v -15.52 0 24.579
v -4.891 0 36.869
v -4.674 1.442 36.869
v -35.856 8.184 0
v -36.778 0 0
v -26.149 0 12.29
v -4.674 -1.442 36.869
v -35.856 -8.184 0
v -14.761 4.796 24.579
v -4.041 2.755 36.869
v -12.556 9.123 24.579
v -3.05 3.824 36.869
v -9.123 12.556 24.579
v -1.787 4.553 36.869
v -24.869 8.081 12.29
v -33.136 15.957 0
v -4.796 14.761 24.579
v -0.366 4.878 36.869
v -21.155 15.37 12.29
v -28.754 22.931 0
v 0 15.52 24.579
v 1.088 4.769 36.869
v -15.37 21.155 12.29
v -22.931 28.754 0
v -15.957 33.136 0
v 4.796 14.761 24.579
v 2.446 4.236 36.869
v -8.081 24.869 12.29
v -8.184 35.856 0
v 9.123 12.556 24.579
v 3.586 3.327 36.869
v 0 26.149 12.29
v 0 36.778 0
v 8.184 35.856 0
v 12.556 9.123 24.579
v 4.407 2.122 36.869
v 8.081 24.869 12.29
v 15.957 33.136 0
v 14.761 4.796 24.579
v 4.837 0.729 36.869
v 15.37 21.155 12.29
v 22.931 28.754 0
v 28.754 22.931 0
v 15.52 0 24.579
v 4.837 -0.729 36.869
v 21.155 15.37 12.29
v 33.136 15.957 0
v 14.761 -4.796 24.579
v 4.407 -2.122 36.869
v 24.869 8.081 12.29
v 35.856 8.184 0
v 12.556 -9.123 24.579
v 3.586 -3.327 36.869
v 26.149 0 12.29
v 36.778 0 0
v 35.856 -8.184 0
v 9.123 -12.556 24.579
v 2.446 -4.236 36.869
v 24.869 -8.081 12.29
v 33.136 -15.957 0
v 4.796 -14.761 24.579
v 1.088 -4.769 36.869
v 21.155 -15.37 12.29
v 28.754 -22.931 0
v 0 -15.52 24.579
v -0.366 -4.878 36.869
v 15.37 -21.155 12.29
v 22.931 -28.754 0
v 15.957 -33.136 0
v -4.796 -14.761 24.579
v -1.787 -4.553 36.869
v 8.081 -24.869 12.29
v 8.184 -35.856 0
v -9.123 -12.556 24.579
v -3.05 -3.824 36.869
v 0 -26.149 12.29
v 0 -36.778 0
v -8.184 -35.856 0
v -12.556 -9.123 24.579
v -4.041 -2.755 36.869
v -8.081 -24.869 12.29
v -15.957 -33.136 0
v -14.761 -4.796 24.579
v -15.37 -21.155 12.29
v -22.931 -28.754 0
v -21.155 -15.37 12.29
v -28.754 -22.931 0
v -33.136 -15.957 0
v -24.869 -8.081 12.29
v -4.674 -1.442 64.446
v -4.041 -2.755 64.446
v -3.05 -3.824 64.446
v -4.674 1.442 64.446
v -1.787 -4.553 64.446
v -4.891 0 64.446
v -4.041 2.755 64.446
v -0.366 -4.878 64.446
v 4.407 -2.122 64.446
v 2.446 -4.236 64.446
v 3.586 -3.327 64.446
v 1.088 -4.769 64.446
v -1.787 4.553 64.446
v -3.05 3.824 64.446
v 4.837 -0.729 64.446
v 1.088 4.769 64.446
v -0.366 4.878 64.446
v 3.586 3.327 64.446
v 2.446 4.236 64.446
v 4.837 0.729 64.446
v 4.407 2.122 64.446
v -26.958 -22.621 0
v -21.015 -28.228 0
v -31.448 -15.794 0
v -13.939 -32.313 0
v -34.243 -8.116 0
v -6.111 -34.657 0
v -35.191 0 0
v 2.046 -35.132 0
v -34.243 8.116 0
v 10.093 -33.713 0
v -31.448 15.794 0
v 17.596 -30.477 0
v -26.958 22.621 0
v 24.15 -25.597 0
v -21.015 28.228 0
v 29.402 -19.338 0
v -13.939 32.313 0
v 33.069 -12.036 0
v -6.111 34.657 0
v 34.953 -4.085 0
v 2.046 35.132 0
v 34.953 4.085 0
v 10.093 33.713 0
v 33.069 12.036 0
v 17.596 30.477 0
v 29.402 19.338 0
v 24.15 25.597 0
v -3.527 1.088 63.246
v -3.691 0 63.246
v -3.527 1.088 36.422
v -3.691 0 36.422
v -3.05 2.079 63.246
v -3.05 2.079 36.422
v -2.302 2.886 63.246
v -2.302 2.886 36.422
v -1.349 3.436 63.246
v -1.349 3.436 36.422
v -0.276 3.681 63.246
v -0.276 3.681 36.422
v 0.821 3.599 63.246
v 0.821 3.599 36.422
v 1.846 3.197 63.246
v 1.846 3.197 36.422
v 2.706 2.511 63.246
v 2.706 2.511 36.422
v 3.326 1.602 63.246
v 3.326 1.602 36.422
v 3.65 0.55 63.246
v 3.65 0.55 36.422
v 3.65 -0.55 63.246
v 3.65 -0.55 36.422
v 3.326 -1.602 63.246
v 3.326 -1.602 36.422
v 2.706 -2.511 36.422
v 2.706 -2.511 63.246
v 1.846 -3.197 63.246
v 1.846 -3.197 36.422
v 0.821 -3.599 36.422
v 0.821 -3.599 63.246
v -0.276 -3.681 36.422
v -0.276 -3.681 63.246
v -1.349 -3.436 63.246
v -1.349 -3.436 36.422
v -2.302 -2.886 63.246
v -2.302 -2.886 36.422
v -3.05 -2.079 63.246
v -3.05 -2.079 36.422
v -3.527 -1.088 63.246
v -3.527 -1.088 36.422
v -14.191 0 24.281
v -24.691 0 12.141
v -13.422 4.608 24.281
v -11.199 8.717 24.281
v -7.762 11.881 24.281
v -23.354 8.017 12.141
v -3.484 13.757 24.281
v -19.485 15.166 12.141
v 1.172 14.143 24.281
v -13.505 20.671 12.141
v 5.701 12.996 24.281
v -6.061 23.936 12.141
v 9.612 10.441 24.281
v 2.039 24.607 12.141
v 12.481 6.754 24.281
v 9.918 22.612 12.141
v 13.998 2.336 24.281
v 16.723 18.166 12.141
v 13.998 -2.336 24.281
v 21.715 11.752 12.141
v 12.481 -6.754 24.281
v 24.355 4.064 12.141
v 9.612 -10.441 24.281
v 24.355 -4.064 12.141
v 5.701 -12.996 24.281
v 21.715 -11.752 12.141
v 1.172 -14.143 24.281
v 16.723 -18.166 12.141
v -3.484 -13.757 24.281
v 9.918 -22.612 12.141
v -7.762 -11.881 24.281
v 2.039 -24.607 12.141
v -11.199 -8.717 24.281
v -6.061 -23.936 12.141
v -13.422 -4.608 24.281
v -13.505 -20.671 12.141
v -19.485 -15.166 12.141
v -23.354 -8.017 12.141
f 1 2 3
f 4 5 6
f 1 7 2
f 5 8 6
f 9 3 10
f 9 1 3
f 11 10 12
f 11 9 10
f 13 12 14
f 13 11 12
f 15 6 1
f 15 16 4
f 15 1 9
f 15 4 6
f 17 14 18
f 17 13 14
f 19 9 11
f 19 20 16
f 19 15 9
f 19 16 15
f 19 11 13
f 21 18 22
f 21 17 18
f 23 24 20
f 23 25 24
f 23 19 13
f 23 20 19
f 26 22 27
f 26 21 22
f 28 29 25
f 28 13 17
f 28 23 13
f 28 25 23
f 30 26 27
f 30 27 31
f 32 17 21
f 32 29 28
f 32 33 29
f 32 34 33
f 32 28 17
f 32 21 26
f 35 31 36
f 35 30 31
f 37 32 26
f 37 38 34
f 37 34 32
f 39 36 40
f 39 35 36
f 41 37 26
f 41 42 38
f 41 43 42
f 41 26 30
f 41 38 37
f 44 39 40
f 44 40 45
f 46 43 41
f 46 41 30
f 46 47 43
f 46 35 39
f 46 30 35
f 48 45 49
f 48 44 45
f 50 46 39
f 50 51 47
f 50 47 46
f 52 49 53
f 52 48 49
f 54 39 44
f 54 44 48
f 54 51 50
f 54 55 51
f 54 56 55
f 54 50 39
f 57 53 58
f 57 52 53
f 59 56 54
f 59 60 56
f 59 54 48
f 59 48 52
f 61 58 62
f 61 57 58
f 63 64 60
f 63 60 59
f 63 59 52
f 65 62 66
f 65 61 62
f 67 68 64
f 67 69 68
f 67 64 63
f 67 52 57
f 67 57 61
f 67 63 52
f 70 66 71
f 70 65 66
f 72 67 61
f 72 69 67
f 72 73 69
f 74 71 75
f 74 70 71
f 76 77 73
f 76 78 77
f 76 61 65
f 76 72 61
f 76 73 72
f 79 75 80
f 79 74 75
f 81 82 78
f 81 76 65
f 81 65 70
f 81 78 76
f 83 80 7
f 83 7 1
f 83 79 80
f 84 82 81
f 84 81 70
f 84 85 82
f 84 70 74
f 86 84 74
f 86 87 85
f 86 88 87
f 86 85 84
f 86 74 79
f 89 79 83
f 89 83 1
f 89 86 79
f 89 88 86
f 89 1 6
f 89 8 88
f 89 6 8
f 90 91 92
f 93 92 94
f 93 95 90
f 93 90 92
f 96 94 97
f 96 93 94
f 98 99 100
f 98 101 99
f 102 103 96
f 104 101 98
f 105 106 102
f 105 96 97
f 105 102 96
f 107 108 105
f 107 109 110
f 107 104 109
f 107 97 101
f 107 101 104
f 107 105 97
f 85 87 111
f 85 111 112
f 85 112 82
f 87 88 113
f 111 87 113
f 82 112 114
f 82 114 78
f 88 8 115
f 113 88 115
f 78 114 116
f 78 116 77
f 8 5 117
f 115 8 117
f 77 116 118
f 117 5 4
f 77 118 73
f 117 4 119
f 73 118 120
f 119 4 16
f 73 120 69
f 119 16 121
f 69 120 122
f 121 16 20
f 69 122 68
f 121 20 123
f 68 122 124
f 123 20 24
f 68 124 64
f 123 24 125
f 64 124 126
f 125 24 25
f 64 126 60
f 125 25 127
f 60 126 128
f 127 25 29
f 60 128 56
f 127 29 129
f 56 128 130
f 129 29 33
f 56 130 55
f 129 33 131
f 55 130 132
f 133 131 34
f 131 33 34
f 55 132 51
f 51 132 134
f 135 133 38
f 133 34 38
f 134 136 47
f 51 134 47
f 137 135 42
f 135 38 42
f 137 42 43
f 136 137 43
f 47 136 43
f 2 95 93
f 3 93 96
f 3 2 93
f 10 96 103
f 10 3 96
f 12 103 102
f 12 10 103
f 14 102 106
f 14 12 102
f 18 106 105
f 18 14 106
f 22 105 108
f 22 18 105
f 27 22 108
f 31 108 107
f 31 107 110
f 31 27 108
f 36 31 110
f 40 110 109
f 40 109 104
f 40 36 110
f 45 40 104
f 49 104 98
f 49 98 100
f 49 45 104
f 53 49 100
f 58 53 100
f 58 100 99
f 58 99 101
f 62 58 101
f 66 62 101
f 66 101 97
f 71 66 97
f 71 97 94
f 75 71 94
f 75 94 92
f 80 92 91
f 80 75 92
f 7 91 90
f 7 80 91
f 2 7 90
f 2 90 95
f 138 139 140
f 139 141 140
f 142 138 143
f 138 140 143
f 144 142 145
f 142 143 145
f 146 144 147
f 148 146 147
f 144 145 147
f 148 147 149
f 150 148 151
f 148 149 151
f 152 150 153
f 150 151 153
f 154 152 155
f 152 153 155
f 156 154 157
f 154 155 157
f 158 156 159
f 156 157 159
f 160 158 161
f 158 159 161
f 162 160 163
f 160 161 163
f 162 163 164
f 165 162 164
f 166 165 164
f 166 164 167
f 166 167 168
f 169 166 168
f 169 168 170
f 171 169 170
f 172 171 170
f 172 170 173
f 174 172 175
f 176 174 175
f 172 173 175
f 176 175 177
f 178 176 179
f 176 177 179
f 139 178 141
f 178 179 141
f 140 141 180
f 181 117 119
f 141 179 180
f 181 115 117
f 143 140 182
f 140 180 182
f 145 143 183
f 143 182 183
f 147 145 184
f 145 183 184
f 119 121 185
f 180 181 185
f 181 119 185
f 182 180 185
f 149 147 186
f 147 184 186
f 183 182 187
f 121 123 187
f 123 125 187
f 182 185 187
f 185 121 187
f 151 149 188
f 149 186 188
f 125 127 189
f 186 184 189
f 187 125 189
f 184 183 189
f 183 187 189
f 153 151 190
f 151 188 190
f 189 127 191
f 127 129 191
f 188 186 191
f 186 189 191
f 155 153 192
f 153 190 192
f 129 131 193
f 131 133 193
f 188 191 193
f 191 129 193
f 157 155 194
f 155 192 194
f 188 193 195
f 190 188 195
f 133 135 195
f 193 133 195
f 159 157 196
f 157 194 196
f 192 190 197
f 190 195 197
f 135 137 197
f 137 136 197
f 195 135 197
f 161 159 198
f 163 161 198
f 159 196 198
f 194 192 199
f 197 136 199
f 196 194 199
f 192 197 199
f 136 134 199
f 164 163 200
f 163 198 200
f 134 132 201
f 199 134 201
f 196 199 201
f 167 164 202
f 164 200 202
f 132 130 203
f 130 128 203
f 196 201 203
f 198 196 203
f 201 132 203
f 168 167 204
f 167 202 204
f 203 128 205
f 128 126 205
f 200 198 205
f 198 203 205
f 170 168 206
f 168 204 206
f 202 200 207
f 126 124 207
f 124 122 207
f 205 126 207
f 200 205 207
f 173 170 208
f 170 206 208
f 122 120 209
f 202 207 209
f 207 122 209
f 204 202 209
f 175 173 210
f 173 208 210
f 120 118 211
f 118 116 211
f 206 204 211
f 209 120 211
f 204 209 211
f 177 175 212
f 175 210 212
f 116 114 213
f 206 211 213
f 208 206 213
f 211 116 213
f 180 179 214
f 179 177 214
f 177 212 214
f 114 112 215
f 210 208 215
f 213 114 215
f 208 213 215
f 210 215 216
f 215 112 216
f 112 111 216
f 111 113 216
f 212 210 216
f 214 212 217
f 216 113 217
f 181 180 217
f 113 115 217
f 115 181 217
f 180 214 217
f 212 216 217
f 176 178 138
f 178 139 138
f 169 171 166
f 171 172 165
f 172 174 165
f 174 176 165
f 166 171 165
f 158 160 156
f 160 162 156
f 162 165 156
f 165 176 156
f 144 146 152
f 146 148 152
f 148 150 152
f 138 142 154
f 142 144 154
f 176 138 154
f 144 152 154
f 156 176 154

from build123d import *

# Parameters (mm, degrees)
F2_T     = 1.2
F4_D     = 300
F4_DEPTH = 1.201


with BuildPart() as f1:
    # F0 (on Front) → F1 (revolve)
    with BuildSketch(Plane.XZ):
        Polygon((-3.6914059892, 36.4218764007), (-35.1914092898, 0), (0, 0), (0, 63.2460936904), (-3.6914059892, 63.2460936904), align=None)
    revolve(axis=Axis((0, 0, 31.6230468452), (0, 0, -1)))

    # F2 (hollow, outwards: the wall grows on the outside; the body as it was is the cavity)
    f2_inside = f1.part
    offset(amount=F2_T, kind=Kind.INTERSECTION)
    add(f2_inside, mode=Mode.SUBTRACT)

    # F4 (through all, one way)
    with BuildSketch(Plane.XY):
        with Locations((0, 0)):
            Circle(F4_D / 2)
    extrude(amount=-F4_DEPTH, mode=Mode.SUBTRACT)


solid = f1.part
